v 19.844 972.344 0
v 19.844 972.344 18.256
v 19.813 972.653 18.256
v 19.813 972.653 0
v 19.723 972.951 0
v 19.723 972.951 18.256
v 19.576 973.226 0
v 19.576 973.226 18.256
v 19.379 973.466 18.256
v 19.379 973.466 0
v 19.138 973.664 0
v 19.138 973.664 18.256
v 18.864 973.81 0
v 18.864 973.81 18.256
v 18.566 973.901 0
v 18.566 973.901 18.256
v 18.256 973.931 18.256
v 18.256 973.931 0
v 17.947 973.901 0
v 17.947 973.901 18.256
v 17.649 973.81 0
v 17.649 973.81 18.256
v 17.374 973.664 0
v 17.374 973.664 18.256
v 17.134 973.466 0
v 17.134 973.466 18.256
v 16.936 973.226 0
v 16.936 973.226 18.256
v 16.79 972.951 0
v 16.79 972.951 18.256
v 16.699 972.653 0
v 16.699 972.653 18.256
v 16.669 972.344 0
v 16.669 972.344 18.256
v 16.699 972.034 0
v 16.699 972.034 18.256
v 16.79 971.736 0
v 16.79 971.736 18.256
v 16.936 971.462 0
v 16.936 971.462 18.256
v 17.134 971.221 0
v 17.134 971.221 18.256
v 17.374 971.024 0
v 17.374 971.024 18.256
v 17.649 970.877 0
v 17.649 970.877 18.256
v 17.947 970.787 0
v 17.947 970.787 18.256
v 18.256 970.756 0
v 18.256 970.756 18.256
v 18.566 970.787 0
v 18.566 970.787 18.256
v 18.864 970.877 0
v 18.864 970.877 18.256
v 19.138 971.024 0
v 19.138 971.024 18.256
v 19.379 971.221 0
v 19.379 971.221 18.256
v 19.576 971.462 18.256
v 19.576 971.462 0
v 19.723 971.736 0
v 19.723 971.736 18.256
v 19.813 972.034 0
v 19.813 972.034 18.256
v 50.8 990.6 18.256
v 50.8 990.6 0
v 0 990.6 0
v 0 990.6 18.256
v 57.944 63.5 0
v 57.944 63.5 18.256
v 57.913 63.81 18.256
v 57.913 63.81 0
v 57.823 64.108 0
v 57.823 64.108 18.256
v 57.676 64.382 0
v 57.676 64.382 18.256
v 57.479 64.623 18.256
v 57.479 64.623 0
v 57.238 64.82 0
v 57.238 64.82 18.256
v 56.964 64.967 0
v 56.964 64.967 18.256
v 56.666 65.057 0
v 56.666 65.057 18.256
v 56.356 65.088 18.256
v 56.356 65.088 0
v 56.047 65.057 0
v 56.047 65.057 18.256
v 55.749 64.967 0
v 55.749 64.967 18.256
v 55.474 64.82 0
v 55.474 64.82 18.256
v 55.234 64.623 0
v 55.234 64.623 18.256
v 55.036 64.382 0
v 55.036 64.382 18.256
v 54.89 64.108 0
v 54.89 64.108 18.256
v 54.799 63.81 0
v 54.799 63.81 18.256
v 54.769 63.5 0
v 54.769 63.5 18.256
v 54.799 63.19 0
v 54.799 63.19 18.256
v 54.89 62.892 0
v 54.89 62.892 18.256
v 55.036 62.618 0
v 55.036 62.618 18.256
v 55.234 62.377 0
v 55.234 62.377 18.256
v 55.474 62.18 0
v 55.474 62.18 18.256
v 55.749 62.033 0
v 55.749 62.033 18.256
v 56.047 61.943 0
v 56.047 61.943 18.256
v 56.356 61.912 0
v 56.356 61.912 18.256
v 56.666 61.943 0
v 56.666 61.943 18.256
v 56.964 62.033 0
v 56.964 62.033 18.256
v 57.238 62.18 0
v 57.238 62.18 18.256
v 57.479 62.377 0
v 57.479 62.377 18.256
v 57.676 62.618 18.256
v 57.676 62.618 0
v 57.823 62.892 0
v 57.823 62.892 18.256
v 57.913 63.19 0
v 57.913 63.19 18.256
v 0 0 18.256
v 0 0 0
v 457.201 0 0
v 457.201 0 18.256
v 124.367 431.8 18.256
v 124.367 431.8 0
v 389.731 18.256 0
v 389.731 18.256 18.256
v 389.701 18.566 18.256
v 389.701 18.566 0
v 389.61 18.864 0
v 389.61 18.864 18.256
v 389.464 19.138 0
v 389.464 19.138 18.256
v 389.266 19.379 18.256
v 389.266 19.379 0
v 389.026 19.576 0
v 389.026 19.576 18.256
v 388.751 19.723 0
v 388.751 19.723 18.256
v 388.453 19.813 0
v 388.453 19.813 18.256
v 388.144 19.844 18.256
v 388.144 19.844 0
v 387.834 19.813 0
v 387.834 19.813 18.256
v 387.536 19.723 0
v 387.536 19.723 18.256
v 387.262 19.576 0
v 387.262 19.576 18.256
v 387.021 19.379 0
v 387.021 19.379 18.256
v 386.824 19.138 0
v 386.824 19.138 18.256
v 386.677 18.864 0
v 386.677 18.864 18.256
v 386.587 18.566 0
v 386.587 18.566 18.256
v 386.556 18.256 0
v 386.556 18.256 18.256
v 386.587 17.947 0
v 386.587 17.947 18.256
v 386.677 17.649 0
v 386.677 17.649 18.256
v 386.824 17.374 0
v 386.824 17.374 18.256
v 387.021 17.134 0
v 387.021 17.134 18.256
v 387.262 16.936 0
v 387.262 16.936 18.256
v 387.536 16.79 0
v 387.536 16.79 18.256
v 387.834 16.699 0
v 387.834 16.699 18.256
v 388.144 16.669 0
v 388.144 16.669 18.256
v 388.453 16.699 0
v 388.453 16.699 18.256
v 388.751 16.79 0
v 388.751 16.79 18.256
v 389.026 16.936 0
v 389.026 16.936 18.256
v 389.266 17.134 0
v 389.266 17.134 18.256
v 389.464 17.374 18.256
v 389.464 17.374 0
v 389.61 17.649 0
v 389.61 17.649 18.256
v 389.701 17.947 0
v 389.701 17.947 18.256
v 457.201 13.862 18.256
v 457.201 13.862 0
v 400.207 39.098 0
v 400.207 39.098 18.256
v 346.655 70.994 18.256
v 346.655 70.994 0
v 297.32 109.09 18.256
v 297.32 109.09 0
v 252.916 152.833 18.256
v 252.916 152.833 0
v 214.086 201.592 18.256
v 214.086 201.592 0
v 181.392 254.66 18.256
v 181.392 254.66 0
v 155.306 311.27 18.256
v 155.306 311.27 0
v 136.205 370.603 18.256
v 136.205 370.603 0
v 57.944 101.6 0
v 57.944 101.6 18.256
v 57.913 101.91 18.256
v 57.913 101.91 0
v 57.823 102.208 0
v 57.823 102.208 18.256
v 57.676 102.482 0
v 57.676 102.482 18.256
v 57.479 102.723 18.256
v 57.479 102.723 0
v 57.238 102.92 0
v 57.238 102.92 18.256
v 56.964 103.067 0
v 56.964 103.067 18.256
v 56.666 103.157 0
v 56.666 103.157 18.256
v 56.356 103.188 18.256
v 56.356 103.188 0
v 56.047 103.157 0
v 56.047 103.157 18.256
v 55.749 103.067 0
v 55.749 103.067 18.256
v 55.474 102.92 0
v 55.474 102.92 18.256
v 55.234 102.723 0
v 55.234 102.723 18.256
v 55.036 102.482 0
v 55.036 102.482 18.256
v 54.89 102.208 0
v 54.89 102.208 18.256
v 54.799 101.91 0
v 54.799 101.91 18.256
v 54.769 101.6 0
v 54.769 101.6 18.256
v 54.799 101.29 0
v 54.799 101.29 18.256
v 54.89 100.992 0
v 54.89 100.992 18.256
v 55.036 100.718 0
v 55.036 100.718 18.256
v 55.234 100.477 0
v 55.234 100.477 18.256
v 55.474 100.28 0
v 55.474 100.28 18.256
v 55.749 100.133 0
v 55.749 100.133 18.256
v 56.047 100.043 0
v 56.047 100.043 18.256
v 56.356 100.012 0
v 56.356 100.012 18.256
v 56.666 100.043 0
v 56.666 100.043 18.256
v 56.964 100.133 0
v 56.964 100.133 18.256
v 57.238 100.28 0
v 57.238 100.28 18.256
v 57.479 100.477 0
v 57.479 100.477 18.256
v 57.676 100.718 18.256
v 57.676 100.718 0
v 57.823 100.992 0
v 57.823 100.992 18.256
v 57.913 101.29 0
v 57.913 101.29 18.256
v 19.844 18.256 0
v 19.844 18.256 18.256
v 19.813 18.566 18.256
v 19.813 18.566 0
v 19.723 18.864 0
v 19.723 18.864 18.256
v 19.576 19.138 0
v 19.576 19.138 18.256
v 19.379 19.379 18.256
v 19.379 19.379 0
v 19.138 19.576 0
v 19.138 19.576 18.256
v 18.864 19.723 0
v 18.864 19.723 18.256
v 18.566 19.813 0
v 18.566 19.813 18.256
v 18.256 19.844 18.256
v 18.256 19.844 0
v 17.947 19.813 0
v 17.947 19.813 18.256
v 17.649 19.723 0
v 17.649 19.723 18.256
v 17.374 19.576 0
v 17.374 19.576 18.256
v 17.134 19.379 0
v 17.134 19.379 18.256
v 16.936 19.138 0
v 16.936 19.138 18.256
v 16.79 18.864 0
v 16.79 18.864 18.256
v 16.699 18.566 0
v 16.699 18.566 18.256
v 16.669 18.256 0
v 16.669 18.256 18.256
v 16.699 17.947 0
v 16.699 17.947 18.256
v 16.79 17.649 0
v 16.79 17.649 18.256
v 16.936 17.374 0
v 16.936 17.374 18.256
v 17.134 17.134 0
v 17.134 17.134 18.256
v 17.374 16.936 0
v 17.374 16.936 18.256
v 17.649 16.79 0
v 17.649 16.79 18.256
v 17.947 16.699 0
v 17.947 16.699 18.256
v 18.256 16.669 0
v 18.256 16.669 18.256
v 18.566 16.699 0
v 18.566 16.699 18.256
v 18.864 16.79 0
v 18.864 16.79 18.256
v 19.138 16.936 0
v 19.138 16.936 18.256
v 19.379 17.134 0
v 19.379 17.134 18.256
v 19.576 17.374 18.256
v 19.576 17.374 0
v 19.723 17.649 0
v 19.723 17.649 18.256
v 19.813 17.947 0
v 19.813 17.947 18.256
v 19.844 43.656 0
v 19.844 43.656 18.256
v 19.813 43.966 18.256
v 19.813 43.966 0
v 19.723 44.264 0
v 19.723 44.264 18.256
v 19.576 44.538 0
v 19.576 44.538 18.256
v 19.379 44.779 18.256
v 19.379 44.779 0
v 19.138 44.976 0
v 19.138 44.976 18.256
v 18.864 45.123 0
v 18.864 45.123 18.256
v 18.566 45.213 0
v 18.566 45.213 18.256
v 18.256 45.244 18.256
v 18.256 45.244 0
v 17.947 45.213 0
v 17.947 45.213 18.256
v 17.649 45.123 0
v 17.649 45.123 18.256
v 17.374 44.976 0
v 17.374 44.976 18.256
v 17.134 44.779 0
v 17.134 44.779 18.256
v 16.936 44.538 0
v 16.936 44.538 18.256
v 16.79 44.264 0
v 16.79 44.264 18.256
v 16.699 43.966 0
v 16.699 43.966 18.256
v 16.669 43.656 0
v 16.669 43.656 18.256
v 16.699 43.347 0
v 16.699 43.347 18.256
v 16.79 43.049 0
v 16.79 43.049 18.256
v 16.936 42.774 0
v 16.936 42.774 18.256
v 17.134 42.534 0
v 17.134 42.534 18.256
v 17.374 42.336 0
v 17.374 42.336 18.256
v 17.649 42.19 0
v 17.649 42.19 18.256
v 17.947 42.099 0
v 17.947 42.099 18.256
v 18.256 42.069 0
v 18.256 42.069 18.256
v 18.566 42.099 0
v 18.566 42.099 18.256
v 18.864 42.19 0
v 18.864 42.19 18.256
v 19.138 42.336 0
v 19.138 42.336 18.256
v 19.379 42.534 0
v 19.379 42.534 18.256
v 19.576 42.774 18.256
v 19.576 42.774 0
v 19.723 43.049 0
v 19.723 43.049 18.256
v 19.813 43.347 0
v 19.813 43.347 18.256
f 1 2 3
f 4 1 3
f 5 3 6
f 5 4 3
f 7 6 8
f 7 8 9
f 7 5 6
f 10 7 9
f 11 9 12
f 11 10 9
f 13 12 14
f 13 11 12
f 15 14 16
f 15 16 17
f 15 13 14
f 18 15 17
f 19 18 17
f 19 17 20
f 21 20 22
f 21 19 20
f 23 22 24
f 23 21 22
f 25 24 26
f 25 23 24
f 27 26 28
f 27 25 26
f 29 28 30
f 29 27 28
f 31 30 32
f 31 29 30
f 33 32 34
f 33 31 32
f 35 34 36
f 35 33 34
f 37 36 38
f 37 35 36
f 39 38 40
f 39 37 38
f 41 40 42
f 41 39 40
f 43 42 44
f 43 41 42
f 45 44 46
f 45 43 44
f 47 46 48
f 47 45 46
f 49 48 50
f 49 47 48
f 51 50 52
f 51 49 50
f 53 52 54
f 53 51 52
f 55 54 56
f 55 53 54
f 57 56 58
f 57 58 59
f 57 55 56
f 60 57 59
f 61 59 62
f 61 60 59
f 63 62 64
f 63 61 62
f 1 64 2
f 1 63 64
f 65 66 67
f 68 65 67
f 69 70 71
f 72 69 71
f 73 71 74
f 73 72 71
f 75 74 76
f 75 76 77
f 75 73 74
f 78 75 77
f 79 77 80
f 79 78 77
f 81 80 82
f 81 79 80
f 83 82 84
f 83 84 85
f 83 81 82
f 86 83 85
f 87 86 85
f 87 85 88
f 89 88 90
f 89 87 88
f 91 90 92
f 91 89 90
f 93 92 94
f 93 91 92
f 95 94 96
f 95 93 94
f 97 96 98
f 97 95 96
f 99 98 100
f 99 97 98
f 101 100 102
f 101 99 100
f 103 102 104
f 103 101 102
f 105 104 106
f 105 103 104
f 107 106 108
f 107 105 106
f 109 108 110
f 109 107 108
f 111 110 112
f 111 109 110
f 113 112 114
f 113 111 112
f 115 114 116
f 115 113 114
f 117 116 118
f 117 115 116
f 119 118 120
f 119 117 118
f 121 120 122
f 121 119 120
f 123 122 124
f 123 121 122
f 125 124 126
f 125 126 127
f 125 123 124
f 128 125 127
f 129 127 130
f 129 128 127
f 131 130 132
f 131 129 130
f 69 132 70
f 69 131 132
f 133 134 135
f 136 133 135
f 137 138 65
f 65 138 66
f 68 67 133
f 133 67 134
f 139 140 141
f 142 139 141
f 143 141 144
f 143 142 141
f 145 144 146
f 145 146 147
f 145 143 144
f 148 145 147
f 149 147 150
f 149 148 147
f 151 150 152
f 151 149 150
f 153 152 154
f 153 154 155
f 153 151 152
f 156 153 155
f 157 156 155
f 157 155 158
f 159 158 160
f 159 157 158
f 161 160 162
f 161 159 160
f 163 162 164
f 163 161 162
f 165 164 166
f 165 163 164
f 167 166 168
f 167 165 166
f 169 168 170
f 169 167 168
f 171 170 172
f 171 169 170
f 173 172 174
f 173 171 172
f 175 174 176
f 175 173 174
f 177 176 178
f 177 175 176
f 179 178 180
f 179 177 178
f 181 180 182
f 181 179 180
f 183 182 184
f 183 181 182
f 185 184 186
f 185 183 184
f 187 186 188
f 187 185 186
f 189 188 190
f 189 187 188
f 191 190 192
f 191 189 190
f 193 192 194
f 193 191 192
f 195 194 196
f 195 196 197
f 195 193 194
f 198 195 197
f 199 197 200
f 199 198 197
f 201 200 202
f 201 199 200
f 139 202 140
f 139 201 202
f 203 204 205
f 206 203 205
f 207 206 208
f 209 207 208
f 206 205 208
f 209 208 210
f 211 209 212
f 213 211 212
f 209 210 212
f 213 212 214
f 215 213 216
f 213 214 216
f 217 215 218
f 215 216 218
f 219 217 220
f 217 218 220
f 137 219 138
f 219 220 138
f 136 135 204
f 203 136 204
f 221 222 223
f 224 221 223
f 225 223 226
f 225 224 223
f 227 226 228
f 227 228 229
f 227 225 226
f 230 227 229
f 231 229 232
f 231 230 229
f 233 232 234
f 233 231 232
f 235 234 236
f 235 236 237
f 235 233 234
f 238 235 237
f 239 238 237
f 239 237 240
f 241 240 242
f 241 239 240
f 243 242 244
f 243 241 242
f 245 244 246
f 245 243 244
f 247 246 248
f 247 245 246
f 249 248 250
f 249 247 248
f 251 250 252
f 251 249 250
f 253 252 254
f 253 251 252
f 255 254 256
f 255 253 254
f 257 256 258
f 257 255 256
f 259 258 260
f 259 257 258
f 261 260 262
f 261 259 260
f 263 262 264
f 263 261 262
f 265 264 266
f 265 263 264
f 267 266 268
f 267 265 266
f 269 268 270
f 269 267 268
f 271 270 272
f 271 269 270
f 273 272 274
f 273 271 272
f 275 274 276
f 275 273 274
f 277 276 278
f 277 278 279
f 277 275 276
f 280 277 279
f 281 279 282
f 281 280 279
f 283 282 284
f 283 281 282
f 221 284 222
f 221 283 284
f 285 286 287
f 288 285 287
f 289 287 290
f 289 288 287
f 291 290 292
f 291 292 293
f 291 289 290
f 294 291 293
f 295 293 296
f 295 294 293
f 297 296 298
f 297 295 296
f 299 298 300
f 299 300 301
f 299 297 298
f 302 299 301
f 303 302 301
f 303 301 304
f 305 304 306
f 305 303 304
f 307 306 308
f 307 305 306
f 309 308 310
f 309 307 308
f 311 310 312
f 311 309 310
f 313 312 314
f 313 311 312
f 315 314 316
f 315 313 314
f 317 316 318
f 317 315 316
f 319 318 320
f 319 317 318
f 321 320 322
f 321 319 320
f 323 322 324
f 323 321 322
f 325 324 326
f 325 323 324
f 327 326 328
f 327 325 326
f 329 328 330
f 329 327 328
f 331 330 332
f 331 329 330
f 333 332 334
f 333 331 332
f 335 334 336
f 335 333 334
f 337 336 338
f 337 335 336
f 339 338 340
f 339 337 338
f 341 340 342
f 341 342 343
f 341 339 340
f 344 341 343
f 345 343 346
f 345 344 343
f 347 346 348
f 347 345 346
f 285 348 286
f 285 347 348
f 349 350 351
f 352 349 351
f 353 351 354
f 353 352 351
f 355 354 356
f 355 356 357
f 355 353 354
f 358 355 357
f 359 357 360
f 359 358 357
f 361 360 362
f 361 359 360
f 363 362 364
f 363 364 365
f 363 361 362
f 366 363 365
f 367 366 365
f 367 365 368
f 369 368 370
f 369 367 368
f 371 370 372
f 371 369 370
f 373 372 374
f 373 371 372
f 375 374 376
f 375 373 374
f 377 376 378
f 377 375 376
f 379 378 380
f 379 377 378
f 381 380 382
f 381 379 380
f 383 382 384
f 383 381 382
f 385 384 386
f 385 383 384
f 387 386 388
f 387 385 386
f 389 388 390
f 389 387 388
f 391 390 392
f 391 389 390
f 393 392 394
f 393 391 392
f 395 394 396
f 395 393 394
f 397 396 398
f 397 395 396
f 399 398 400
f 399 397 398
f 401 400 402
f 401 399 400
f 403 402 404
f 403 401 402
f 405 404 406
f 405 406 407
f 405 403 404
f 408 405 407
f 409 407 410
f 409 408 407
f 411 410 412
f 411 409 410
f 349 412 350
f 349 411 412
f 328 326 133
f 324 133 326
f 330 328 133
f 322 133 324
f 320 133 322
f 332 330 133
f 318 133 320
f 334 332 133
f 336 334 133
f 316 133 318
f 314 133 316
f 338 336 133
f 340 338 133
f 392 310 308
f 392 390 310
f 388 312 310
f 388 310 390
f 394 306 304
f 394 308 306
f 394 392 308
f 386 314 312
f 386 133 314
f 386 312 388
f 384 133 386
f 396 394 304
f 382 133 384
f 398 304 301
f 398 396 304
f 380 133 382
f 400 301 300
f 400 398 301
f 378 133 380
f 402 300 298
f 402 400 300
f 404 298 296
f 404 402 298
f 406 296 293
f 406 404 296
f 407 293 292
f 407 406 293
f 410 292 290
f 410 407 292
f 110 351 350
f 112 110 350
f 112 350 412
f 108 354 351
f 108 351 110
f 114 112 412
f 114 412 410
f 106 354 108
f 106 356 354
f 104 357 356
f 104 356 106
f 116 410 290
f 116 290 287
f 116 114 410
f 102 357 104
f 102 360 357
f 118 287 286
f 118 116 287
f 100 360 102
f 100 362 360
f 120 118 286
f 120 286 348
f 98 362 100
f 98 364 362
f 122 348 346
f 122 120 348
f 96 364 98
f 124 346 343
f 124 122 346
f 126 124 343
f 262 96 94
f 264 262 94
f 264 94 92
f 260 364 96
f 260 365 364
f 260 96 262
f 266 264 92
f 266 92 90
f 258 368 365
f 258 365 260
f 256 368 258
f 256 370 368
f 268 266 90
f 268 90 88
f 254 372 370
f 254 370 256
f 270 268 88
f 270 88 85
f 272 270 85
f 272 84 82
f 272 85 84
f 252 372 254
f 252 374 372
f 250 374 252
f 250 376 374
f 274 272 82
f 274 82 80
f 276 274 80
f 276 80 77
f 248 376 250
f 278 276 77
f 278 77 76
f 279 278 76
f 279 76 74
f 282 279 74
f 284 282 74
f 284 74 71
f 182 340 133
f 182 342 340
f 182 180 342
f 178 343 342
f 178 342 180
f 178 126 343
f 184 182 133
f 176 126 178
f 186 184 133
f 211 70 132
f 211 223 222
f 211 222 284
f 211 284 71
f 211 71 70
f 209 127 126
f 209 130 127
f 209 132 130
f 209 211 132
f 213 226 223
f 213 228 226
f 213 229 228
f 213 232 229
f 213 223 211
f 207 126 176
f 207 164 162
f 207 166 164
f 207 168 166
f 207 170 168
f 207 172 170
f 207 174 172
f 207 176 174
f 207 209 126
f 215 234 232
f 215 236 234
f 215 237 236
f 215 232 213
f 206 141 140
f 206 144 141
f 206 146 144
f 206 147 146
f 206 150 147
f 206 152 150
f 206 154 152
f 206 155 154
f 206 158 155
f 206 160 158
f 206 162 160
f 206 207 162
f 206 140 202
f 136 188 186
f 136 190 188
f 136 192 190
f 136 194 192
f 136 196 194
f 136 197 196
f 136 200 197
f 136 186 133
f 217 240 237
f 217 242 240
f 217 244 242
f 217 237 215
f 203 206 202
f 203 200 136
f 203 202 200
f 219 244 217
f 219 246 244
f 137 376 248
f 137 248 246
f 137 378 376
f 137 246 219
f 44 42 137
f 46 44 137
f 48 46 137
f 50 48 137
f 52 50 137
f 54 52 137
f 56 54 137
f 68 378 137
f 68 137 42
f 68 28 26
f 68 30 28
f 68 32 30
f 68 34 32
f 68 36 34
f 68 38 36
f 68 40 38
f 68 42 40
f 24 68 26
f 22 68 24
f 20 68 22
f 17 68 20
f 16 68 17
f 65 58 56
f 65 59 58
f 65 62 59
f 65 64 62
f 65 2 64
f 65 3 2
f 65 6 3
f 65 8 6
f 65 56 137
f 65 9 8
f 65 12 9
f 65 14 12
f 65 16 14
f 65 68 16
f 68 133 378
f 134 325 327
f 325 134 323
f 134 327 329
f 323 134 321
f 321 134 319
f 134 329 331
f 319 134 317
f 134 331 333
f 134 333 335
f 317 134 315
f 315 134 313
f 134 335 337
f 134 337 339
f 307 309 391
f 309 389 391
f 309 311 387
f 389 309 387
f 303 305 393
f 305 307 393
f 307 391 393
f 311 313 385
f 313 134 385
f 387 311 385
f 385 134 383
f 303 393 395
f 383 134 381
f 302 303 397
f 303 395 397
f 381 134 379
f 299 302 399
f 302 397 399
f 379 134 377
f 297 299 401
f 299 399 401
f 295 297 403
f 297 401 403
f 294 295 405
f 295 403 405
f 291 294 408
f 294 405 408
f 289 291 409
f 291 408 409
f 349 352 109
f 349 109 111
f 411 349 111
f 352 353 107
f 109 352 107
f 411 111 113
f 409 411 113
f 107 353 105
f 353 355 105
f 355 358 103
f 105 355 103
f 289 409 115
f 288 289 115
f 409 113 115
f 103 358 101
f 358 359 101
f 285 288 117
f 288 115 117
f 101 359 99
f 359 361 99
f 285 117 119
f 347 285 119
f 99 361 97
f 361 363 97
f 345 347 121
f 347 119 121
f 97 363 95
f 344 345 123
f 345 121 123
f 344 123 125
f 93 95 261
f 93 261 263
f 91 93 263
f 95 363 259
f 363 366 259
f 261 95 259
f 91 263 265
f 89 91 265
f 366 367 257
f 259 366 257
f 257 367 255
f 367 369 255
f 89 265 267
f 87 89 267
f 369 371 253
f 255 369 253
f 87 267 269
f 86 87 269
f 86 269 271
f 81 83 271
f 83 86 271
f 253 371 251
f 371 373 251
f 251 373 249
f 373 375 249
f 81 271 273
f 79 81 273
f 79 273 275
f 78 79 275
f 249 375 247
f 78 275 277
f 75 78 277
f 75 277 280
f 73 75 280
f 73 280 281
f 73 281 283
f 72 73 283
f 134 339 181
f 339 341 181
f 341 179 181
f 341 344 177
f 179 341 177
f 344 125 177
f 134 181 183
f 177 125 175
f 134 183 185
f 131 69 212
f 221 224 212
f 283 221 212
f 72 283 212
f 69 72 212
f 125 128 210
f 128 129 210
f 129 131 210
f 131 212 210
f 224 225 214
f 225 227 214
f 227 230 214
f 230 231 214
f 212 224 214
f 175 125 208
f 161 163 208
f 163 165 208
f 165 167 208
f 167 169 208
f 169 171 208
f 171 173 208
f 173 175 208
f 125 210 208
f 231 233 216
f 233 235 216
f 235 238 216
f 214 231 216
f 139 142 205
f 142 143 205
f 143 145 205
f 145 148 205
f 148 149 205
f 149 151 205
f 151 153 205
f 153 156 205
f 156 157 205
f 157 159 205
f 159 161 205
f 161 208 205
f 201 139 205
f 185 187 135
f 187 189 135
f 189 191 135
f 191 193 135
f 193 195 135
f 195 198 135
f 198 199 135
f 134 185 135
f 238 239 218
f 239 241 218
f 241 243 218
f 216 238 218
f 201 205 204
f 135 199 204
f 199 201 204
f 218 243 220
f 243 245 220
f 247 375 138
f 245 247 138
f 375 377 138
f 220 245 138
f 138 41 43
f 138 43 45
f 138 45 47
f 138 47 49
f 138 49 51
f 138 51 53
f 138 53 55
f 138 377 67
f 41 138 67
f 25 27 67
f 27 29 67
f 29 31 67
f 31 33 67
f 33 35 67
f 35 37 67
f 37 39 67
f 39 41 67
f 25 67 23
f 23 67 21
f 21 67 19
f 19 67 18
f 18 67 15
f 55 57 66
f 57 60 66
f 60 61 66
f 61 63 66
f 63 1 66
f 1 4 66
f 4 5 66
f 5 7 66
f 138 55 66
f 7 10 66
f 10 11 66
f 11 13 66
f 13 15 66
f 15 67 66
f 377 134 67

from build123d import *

# Parameters (mm, degrees)
SKETCH1_R           = 1.5875
BOSS_EXTRUDE1_DEPTH = 18.25625


with BuildPart() as part:
    # Sketch1 → Boss-Extrude1 (new body)
    with BuildSketch(Plane.XY):
        with BuildLine():
            Line((0, 990.6), (0, 0))
            Line((0, 0), (457.201, 0))
            Line((457.201, 0), (457.201, 13.862038208))
            ThreePointArc((457.201, 13.862038208), (232.767577124, 176.628269142), (124.367415652, 431.8))
            Line((124.367415652, 431.8), (50.8, 990.6))
            Line((50.8, 990.6), (0, 990.6))
        make_face()
        with Locations((18.25625, 18.25625)):
            Circle(SKETCH1_R, mode=Mode.SUBTRACT)
        with Locations((18.25625, 43.65625)):
            Circle(SKETCH1_R, mode=Mode.SUBTRACT)
        with Locations((56.35625, 63.5)):
            Circle(SKETCH1_R, mode=Mode.SUBTRACT)
        with Locations((56.35625, 101.6)):
            Circle(SKETCH1_R, mode=Mode.SUBTRACT)
        with Locations((388.14375, 18.25625)):
            Circle(SKETCH1_R, mode=Mode.SUBTRACT)
        with Locations((18.25625, 972.34375)):
            Circle(SKETCH1_R, mode=Mode.SUBTRACT)
    extrude(amount=BOSS_EXTRUDE1_DEPTH)


solid = part.part
